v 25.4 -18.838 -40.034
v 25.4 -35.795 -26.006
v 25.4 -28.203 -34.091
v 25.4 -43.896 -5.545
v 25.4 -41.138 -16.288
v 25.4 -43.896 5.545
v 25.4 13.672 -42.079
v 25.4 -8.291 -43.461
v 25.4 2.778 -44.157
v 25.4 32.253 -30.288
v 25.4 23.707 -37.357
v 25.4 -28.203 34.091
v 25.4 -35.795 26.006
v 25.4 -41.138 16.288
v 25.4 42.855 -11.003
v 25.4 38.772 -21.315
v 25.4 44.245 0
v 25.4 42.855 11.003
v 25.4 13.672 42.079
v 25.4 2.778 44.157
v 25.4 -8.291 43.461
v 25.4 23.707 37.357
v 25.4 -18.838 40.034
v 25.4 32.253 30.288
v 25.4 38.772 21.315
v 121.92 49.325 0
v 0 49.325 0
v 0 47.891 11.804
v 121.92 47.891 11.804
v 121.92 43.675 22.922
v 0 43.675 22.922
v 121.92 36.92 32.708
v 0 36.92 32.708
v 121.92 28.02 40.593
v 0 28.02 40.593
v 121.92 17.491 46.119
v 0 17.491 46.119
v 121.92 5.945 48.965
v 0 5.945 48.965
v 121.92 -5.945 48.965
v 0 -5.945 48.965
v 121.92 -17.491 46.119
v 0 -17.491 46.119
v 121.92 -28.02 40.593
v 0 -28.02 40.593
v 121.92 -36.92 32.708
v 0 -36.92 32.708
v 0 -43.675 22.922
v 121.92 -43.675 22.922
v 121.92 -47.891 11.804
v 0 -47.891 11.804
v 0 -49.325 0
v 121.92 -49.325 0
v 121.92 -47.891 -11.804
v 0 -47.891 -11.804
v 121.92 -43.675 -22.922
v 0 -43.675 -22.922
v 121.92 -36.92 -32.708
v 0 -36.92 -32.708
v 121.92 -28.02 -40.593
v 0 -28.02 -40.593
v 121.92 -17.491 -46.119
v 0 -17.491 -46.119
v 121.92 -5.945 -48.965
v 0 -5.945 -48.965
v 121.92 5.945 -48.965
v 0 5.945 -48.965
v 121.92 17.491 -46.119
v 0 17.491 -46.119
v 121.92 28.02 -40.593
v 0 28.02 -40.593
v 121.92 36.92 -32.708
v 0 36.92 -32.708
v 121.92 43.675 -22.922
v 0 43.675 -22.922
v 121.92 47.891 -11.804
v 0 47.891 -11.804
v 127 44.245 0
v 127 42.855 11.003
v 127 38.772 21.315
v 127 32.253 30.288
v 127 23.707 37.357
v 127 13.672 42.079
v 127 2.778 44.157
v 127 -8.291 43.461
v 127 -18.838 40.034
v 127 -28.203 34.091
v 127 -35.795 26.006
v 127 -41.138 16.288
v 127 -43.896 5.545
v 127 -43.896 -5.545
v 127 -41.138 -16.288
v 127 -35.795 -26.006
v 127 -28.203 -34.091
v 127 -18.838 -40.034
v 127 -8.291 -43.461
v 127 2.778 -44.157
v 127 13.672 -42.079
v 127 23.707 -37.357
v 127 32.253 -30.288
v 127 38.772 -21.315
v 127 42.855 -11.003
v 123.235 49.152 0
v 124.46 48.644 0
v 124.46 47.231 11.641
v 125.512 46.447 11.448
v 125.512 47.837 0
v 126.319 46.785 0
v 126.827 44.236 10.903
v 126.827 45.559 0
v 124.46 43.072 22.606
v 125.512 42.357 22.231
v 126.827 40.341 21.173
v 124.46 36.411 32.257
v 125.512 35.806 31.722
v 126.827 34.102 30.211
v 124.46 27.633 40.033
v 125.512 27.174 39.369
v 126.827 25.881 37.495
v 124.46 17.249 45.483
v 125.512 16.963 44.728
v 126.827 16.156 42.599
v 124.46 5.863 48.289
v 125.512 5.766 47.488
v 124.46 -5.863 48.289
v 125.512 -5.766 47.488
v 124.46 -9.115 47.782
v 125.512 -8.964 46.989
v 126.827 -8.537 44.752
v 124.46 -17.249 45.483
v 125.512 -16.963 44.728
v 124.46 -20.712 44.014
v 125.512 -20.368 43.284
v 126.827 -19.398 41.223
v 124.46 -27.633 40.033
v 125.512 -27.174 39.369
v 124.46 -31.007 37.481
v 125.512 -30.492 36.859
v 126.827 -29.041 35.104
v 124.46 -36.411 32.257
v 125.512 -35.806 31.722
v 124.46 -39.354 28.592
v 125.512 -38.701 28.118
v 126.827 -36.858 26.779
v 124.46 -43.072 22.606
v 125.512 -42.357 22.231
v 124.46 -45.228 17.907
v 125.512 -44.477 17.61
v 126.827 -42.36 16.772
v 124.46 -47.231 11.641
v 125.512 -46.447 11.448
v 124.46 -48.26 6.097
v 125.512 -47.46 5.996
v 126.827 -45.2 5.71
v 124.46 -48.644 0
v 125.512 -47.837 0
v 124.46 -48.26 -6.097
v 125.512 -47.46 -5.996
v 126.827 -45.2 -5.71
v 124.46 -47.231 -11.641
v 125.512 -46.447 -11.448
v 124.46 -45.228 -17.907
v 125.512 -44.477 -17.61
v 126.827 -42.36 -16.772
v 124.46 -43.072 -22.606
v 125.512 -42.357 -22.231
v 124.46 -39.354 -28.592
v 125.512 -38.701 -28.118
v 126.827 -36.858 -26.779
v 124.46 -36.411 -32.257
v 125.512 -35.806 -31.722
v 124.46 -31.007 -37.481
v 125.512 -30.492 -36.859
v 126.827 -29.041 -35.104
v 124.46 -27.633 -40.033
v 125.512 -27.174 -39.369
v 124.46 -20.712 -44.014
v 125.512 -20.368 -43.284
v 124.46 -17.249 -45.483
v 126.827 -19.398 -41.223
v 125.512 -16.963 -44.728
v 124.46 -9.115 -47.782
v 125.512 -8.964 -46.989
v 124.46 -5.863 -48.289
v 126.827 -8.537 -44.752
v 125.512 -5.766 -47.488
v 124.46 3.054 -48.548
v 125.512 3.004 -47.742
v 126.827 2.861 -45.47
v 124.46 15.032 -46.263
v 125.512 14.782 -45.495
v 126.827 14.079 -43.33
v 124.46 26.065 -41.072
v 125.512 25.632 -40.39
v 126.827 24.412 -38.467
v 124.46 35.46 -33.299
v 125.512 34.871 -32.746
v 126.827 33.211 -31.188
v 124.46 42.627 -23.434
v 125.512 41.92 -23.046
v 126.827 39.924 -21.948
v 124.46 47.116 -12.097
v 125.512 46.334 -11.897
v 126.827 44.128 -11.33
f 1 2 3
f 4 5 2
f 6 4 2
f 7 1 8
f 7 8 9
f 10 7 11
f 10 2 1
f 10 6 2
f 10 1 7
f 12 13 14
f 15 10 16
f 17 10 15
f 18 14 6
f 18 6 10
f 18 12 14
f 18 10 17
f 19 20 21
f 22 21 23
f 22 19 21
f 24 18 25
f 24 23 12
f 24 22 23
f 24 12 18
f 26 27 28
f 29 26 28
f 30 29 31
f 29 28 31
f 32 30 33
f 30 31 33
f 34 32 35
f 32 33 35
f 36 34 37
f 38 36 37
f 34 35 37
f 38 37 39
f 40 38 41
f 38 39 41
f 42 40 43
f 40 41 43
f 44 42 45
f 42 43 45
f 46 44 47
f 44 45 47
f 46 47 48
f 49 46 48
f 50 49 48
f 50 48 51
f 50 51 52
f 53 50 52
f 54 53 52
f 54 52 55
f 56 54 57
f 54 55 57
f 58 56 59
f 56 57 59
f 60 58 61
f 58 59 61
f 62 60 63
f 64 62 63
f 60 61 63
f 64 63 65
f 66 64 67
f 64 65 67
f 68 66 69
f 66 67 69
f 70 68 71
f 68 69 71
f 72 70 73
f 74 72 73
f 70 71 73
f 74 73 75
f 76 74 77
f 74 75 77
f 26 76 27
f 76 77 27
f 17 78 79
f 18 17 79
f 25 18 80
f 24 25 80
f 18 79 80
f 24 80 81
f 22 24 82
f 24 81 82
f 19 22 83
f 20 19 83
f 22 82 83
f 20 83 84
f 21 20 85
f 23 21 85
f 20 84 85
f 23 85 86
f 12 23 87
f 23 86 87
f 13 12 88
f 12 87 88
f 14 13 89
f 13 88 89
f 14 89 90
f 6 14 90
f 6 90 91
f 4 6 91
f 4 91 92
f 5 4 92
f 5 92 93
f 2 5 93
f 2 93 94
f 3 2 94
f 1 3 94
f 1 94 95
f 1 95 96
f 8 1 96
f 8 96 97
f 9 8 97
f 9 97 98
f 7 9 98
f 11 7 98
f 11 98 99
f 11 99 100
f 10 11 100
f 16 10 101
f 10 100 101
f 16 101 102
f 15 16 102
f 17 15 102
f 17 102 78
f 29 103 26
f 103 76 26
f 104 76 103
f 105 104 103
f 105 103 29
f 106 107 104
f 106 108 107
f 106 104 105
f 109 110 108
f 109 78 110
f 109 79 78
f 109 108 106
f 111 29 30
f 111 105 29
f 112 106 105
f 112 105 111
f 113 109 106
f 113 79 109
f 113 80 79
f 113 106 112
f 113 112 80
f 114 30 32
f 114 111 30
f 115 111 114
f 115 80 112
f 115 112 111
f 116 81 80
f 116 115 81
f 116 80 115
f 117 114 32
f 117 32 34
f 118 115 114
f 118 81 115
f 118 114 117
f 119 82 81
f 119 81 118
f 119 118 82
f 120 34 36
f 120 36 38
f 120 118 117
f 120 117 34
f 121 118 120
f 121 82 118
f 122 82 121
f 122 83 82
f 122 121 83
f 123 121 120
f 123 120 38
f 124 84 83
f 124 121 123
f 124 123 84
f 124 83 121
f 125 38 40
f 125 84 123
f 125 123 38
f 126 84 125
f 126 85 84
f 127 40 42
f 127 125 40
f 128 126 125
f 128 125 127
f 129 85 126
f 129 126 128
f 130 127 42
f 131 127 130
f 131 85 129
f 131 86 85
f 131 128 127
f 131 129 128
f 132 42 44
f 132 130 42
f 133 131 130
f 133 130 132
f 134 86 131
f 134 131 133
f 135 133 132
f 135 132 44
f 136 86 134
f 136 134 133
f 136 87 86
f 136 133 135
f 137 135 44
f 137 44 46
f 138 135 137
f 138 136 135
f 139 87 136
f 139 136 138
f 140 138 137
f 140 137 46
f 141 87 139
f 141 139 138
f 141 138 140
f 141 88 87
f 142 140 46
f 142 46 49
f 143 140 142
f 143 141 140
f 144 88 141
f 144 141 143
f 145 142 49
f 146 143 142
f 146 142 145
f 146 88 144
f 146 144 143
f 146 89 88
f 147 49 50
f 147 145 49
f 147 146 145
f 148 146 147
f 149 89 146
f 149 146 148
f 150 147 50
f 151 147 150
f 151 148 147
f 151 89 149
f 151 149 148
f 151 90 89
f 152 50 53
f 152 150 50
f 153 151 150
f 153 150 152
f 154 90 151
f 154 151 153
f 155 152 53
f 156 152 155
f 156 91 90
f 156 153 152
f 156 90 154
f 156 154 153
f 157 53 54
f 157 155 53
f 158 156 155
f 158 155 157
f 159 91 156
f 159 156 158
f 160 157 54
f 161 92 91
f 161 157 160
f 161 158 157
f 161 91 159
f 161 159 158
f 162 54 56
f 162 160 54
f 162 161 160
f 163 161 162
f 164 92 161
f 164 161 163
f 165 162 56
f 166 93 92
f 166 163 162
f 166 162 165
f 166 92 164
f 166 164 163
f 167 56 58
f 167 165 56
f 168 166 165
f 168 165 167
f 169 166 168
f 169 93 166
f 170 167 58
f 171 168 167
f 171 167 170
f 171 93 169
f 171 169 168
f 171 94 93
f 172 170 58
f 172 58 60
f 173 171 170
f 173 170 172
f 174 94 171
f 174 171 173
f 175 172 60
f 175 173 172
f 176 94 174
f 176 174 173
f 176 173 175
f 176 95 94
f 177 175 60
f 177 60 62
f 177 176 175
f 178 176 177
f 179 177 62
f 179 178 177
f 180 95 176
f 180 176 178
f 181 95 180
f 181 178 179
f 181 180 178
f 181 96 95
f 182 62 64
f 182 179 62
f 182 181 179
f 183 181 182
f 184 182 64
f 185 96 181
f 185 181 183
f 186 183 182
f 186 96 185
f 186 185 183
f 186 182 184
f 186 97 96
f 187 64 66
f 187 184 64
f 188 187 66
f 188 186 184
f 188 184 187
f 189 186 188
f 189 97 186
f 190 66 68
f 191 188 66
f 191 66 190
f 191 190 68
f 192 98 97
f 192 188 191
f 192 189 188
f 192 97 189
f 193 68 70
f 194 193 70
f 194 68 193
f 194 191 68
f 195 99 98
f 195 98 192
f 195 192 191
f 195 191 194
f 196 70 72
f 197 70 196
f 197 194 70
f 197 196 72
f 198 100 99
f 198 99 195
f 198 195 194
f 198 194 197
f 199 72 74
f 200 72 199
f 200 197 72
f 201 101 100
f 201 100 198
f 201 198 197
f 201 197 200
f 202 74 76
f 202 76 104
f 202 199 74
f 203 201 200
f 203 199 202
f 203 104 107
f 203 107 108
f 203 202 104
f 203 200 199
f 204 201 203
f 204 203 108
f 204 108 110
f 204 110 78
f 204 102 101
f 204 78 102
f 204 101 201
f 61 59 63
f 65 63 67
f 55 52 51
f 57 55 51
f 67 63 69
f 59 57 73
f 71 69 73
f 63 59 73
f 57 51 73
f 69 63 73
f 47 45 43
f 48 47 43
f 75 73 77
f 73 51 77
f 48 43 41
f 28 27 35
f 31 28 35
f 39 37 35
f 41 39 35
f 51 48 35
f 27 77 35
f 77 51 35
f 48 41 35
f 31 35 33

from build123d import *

# Parameters (mm, degrees)
F0_R     = 49.3246068697
F1_DEPTH = 127
F2_R     = 5.08
F3_DEPTH = 25.4
F4_DEPTH = 25.4
F5_DEPTH = 25.4
F6_DEPTH = 25.4


with BuildPart() as f1:
    # F0 (on Right) → F1 (new body)
    with BuildSketch(Plane.YZ):
        Circle(F0_R)
    extrude(amount=F1_DEPTH)

    # F2
    f2_edges = [f1.edges().sort_by_distance(p)[0] for p in [
        (127, -49.324607, 0),
    ]]
    fillet(f2_edges, radius=F2_R)

    # F3 (cut): a face of the model
    f3_faces = [f1.faces().sort_by_distance(p)[0] for p in [
        (127, 0, 0),
    ]]
    extrude(f3_faces, amount=-F3_DEPTH, mode=Mode.SUBTRACT)

    # F4 (cut): a face of the model
    f4_faces = [f1.faces().sort_by_distance(p)[0] for p in [
        (101.6, 0, 0),
    ]]
    extrude(f4_faces, amount=-F4_DEPTH, mode=Mode.SUBTRACT)

    # F5 (cut): a face of the model
    f5_faces = [f1.faces().sort_by_distance(p)[0] for p in [
        (76.2, 0, 0),
    ]]
    extrude(f5_faces, amount=-F5_DEPTH, mode=Mode.SUBTRACT)

    # F6 (cut): a face of the model
    f6_faces = [f1.faces().sort_by_distance(p)[0] for p in [
        (50.8, 0, 0),
    ]]
    extrude(f6_faces, amount=-F6_DEPTH, mode=Mode.SUBTRACT)


solid = f1.part
